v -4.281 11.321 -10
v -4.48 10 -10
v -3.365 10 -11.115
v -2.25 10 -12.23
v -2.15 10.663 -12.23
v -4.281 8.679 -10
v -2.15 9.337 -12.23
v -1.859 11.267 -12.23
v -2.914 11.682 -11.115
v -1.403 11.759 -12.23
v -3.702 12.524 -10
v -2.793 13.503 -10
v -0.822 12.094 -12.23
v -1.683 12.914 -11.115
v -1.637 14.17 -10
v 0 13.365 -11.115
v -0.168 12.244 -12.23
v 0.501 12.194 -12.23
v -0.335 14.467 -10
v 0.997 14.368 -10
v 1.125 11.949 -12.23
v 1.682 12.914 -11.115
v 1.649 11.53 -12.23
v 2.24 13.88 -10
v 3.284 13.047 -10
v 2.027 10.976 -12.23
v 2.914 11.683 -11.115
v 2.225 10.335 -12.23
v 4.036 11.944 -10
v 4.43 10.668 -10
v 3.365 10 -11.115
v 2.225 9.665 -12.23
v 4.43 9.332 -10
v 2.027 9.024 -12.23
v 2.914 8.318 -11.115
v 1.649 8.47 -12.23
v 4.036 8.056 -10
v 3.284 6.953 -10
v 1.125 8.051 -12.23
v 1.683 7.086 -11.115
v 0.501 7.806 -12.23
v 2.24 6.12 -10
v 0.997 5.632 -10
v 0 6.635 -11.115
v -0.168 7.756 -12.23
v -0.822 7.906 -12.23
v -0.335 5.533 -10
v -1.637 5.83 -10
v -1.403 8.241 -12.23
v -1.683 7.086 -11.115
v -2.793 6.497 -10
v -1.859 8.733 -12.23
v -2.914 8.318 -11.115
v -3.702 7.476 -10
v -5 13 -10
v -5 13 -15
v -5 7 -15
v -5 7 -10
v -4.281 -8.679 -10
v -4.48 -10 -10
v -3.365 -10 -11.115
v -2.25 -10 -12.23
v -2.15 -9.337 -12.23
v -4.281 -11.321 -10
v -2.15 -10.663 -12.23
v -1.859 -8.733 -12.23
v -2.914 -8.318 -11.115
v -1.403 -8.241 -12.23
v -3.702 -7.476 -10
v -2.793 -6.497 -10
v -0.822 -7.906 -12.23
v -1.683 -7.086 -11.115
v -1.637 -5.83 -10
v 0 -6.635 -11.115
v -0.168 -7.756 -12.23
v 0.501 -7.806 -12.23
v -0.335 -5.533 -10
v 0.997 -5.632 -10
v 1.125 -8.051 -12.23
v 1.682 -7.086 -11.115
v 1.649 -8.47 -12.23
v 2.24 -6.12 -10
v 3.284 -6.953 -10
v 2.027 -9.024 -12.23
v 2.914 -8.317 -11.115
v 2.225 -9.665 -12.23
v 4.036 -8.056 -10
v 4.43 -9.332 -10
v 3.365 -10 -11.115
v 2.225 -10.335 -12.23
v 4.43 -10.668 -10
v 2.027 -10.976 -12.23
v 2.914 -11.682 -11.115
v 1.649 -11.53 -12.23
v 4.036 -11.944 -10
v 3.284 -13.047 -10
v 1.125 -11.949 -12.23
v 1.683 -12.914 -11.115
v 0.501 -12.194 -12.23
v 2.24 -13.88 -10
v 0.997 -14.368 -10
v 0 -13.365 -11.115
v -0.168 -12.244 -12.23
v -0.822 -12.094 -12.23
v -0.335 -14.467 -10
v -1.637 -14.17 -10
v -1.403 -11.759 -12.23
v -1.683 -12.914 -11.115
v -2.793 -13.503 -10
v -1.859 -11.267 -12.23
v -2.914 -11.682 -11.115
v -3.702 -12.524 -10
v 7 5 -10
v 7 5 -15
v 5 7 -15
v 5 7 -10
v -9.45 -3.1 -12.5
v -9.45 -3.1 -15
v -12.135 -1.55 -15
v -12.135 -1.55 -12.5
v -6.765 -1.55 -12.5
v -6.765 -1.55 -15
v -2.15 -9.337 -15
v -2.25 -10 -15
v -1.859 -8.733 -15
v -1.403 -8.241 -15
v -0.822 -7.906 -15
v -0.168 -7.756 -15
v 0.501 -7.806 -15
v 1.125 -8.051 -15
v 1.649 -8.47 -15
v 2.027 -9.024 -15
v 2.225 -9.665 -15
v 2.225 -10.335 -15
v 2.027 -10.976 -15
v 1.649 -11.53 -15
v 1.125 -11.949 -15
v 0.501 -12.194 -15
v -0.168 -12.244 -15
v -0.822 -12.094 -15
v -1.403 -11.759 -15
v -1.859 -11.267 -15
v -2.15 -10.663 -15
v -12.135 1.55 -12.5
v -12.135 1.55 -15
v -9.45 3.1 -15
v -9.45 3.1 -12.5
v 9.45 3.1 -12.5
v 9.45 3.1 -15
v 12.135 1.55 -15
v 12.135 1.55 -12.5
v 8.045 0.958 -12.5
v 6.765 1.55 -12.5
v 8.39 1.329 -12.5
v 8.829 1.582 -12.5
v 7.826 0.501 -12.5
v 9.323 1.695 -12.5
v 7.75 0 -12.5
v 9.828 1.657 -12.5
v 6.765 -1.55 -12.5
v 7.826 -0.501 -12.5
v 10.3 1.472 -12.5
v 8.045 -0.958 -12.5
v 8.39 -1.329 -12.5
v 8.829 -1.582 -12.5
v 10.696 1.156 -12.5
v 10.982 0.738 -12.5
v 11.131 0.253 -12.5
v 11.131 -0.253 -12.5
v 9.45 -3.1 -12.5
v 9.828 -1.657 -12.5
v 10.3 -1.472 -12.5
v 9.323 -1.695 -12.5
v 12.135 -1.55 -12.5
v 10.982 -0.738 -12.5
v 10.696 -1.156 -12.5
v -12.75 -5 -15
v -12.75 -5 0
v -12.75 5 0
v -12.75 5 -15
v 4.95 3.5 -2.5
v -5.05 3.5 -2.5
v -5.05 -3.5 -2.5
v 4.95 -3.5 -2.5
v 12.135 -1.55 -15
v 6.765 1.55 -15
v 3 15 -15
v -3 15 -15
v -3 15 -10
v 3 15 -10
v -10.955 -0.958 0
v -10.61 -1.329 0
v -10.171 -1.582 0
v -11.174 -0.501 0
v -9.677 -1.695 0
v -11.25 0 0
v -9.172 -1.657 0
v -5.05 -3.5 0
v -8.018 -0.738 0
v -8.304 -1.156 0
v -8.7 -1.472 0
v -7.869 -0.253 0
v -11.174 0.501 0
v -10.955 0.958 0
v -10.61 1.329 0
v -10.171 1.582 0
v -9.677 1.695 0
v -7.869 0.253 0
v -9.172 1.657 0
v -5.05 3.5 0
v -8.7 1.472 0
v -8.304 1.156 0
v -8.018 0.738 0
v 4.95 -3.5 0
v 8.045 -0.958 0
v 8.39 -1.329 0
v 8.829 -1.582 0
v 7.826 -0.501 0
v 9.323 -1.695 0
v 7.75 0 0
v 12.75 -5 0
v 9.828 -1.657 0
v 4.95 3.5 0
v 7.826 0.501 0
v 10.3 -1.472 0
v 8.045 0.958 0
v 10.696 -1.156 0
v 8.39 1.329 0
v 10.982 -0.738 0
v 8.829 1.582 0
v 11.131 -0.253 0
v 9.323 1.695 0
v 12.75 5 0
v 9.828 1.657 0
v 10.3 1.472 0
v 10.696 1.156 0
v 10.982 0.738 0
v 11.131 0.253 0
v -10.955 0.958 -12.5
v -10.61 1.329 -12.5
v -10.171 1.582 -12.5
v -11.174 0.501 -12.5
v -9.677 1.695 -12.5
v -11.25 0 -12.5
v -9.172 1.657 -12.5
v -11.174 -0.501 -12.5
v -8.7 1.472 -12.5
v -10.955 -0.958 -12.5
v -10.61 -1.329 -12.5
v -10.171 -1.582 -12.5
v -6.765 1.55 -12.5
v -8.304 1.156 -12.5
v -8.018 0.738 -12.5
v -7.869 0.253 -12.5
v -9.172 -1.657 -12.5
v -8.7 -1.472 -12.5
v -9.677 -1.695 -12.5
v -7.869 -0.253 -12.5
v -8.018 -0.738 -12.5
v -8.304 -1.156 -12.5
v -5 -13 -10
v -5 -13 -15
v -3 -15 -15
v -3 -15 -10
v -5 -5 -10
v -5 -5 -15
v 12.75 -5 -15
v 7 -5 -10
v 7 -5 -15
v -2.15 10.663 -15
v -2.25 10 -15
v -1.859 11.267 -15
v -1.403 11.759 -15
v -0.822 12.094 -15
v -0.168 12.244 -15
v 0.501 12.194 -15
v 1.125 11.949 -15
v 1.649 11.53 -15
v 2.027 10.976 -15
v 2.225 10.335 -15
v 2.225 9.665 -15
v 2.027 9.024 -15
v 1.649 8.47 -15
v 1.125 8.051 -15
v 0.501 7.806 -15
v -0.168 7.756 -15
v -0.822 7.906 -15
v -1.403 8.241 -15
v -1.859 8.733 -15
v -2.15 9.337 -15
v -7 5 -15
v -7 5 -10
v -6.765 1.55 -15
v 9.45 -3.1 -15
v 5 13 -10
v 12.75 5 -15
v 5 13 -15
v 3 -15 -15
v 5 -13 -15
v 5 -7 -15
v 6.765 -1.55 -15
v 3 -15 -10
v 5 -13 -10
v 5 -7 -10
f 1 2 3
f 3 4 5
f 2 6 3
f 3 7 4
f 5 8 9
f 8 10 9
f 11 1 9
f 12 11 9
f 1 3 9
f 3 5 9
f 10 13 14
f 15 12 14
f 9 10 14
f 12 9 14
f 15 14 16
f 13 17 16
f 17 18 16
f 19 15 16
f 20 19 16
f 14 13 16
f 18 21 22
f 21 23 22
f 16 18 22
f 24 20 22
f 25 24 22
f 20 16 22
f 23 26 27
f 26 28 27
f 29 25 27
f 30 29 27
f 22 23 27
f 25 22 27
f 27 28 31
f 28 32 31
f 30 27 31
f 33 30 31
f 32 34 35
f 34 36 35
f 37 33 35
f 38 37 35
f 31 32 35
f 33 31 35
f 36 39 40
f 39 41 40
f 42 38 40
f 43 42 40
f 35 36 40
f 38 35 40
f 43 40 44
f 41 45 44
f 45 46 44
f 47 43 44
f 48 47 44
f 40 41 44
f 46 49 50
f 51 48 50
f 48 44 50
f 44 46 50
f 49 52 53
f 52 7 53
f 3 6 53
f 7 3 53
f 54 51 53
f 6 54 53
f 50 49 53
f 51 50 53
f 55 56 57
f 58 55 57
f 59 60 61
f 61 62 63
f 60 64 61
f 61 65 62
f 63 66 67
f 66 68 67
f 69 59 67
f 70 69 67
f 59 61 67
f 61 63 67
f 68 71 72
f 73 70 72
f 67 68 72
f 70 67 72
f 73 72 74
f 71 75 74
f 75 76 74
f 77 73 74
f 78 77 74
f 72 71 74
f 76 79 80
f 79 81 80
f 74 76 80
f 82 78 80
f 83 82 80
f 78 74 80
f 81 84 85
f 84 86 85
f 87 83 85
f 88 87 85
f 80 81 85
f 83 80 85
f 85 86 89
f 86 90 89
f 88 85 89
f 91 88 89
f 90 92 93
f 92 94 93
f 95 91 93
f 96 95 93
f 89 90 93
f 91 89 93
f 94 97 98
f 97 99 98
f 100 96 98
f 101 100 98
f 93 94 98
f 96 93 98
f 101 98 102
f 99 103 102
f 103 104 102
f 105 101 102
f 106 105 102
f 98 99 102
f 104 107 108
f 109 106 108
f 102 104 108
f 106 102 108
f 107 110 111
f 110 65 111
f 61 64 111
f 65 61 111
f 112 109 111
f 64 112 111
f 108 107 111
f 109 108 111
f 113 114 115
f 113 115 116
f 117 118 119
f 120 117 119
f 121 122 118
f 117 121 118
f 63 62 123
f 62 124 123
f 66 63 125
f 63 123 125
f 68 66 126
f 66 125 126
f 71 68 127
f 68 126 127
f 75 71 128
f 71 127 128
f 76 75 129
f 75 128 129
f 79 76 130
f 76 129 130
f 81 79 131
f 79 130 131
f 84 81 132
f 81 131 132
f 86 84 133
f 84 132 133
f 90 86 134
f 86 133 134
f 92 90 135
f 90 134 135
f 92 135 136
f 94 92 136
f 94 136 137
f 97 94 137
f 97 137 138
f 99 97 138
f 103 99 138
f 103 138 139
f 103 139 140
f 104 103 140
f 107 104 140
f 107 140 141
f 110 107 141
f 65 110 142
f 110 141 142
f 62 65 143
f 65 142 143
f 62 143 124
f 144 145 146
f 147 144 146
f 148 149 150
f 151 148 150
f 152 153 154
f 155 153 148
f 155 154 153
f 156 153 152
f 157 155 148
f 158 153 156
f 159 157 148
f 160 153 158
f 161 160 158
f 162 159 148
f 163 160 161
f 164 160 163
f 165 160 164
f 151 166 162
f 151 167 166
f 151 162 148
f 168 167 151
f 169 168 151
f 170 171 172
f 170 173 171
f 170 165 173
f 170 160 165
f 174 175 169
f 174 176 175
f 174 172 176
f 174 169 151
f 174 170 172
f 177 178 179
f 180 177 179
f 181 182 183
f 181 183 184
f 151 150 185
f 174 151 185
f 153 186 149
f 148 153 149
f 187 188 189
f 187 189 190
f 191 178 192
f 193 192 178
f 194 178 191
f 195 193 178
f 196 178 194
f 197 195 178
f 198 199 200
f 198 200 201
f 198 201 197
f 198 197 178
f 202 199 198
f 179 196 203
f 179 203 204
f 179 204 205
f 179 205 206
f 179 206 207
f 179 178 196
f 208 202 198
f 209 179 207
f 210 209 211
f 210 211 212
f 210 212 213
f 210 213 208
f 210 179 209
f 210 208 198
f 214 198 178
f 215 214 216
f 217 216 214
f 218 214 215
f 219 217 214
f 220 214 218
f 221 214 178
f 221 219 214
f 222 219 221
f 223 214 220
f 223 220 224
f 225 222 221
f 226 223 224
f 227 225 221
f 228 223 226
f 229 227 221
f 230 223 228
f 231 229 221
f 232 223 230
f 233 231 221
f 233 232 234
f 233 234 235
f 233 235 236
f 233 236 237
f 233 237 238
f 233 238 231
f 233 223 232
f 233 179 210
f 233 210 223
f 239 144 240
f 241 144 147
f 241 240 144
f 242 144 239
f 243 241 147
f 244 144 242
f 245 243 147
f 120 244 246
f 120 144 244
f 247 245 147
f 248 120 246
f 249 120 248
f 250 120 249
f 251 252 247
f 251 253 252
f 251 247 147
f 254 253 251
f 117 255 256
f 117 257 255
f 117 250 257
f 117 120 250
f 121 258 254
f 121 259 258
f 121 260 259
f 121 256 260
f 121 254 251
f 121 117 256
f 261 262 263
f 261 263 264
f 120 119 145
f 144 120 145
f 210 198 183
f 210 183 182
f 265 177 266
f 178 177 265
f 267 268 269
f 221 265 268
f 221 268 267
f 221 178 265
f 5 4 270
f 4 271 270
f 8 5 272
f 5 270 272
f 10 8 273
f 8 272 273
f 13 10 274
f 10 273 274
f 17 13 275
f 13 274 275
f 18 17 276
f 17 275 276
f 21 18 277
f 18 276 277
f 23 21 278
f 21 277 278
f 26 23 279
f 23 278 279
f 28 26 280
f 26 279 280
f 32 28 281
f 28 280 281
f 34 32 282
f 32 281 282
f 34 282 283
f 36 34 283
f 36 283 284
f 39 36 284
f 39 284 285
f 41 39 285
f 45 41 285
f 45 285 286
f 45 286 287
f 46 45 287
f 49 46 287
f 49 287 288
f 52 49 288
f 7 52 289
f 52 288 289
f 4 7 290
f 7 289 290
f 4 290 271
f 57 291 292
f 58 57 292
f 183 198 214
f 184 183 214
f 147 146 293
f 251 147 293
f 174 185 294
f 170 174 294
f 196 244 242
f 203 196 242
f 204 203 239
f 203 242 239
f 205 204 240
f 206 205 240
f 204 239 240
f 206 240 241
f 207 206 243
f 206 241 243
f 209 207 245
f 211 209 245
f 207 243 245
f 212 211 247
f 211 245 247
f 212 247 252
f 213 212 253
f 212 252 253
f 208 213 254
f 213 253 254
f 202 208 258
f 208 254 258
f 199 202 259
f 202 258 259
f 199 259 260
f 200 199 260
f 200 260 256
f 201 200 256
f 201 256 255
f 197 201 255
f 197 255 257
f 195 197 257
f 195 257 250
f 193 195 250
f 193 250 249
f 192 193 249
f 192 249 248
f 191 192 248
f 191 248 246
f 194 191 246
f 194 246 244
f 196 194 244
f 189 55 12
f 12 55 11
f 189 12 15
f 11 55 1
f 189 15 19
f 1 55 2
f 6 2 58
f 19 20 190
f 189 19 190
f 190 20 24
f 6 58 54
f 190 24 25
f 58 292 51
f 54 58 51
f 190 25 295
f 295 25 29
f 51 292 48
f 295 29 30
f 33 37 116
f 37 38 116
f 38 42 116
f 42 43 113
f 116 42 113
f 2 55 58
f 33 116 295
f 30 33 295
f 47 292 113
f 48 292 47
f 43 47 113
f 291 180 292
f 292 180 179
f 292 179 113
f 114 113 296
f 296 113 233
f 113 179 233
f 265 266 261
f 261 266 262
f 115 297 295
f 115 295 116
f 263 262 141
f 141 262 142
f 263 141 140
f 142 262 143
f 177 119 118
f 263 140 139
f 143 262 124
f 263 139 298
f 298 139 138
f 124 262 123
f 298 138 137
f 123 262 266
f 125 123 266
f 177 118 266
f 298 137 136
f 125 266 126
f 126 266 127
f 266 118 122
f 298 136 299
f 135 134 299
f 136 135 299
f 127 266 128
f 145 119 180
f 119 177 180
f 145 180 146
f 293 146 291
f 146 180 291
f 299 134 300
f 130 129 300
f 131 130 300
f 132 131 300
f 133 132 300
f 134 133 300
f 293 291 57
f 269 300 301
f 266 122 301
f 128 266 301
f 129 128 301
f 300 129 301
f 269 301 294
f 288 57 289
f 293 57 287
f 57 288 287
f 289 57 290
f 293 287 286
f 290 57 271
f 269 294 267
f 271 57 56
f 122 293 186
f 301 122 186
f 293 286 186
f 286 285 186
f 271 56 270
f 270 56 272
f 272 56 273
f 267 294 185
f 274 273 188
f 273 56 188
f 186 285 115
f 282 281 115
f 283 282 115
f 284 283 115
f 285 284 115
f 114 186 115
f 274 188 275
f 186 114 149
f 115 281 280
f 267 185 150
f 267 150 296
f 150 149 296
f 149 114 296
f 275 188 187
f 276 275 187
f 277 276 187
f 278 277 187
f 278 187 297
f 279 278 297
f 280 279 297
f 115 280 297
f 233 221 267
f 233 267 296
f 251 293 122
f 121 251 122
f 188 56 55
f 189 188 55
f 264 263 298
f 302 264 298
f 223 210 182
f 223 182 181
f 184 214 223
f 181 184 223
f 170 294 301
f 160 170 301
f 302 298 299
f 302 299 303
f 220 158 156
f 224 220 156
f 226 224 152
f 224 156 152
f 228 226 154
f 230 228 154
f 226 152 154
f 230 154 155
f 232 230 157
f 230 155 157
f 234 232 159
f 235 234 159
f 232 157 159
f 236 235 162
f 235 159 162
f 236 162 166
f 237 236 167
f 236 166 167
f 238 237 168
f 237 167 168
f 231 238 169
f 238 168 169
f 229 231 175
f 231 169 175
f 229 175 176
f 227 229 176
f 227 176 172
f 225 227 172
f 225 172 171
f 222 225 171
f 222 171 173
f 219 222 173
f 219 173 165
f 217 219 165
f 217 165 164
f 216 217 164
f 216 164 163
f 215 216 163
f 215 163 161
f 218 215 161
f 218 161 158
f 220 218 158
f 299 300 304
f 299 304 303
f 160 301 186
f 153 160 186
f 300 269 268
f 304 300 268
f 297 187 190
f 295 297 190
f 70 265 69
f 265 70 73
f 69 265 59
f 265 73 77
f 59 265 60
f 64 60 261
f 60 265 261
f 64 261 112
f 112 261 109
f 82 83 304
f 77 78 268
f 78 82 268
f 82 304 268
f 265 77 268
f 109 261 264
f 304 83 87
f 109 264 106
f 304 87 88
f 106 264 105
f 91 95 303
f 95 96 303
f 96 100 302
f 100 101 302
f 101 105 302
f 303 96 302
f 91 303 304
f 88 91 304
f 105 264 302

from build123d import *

# Parameters (mm, degrees)
F0_W           = 25.5
F0_H           = 10
F1_DEPTH       = 15
F2_D           = 3.4
F3_W           = 10
F3_H           = 7
F4_DEPTH       = 2.5
F5_W           = 10
F5_H           = 10
F6_DEPTH       = 5
F8_D           = 4.5
F8_CSINK_D     = 8.96
F8_CSINK_ANGLE = 90
F9_SIZE        = 2
F11_DEPTH      = 2.5


with BuildPart() as f1:
    # F0 (on Top) → F1 (new body)
    with BuildSketch(Plane.XY):
        Rectangle(F0_W, F0_H)
    extrude(amount=-F1_DEPTH)

    # F2 (through all)
    with Locations(Plane.XY):
        with Locations((-9.55, 0), (9.45, 0)):
            Hole(F2_D / 2)

    # F3 (on face) → F4 (cut)
    with BuildSketch(Plane.XY):
        with Locations((-0.05, 0)):
            Rectangle(F3_W, F3_H)
    extrude(amount=-F4_DEPTH, mode=Mode.SUBTRACT)

    # F5 (on face) → F6 (join)
    with BuildSketch(Plane(origin=(0, 0, -15), x_dir=(1, 0, 0), z_dir=(0, 0, -1))):
        with Locations((0, 10)):
            Rectangle(F5_W, F5_H)
        with Locations((0, -10)):
            Rectangle(F5_W, F5_H)
    extrude(amount=-F6_DEPTH)

    # F8 (through all)
    with Locations(Plane.XY.offset(-10)):
        with Locations((0, -10), (0, 10)):
            CounterSinkHole(F8_D / 2, F8_CSINK_D / 2, counter_sink_angle=F8_CSINK_ANGLE)

    # F9
    f9_edges = [f1.edges().sort_by_distance(p)[0] for p in [
        (-5, 15, -12.5),
        (5, 15, -12.5),
        (5, 5, -12.5),
        (-5, 5, -12.5),
        (5, -5, -12.5),
        (5, -15, -12.5),
        (-5, -15, -12.5),
    ]]
    chamfer(f9_edges, length=F9_SIZE)

    # F10 (on face) → F11 (cut)
    with BuildSketch(Plane(origin=(0, 0, -15), x_dir=(1, 0, 0), z_dir=(0, 0, -1))):
        Polygon((6.7653212483, -1.55), (9.45, -3.1), (12.1346787517, -1.55), (12.1346787517, 1.55), (9.45, 3.1), (6.7653212483, 1.55), align=None)
        Polygon((-12.1346787517, -1.55), (-9.45, -3.1), (-6.7653212483, -1.55), (-6.7653212483, 1.55), (-9.45, 3.1), (-12.1346787517, 1.55), align=None)
    extrude(amount=-F11_DEPTH, mode=Mode.SUBTRACT)


solid = f1.part
